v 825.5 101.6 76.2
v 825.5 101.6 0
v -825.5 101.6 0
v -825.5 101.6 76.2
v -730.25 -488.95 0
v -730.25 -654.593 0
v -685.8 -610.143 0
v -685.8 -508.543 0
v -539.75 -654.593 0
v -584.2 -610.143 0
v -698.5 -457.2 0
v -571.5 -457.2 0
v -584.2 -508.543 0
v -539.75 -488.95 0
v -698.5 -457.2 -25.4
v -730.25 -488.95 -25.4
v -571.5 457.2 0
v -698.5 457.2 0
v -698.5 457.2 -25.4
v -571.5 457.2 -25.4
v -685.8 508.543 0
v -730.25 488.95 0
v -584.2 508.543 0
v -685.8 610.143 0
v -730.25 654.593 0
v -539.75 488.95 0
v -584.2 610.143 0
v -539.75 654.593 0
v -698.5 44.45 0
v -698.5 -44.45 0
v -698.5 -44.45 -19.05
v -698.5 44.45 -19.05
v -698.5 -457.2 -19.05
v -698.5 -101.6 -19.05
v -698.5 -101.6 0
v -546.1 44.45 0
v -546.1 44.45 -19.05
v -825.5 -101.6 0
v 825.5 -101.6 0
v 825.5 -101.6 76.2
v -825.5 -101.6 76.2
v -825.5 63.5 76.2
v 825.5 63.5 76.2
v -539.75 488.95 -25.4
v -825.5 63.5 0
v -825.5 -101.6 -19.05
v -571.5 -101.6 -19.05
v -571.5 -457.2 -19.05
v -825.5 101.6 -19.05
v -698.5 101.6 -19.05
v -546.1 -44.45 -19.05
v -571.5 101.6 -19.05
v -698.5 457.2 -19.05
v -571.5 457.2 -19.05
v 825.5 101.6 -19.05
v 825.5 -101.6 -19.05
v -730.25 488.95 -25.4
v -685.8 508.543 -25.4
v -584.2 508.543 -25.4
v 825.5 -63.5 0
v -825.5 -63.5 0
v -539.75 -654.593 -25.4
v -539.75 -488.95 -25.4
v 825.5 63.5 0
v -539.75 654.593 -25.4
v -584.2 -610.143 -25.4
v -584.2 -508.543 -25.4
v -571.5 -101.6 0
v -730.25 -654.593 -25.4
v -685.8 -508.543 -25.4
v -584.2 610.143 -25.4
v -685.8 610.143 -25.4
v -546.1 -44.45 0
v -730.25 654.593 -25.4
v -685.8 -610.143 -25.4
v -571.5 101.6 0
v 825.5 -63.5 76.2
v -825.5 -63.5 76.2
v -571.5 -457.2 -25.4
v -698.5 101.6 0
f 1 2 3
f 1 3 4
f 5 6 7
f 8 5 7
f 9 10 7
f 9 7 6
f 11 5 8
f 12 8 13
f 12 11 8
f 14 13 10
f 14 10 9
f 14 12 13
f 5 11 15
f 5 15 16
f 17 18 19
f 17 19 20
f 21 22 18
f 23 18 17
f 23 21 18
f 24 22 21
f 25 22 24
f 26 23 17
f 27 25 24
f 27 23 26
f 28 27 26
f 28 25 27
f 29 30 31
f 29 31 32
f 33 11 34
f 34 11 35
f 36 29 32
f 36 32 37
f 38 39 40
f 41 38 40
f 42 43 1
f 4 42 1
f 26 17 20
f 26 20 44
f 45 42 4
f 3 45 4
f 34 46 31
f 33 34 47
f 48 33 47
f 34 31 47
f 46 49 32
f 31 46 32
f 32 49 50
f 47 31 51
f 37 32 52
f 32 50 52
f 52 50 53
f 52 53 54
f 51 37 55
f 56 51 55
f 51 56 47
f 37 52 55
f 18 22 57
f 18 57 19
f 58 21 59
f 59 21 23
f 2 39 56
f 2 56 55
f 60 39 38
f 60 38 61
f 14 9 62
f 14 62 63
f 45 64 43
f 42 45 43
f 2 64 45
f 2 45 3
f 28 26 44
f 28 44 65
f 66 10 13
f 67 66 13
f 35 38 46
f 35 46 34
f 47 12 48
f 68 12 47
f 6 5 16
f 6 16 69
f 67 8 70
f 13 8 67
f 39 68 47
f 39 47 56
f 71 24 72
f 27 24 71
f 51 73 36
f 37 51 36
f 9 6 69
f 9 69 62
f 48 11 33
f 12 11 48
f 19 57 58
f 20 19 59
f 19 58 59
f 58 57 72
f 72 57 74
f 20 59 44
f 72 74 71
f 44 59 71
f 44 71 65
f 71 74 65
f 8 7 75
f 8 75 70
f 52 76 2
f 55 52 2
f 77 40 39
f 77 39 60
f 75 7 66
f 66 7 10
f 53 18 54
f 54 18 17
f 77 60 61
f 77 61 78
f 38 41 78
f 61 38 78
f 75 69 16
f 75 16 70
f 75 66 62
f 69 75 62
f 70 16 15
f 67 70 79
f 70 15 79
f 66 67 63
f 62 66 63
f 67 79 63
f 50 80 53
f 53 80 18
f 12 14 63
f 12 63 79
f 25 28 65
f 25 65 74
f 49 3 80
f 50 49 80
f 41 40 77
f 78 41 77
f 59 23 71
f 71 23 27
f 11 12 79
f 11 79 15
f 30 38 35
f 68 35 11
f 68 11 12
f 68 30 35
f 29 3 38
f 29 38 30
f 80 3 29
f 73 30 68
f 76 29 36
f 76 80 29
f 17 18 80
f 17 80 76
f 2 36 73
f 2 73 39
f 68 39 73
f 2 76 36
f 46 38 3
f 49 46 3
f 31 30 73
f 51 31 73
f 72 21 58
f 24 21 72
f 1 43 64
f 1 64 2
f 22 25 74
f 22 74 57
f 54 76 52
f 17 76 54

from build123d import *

# Parameters (mm, degrees)
F0_W     = 1651
F0_H     = 914.4
F0_W_2   = 152.4
F0_H_2   = 88.9
F1_DEPTH = 19.05
F2_W     = 38.1
F2_H     = 76.2
F3_DEPTH = 1651
F4_W     = 1397
F4_H     = 355.6
F4_W_2   = 127
F5_DEPTH = 19.051
F6_W     = 101.6
F6_H     = 101.6
F7_DEPTH = 25.4


with BuildPart() as f1:
    # F0 (on Top) → F1 (new body)
    with BuildSketch(Plane.XY):
        Rectangle(F0_W, F0_H)
        with Locations((-622.3, 0)):
            Rectangle(F0_W_2, F0_H_2, mode=Mode.SUBTRACT)
    extrude(amount=-F1_DEPTH)

    # F4 (on face) → F5 (cut, through all)
    with BuildSketch(Plane.XY):
        with Locations((127, -279.4)):
            Rectangle(F4_W, F4_H)
        with Locations((-762, -279.4)):
            Rectangle(F4_W_2, F4_H)
        with Locations((127, 279.4)):
            Rectangle(F4_W, F4_H)
        with Locations((-762, 279.4)):
            Rectangle(F4_W_2, F4_H)
    extrude(amount=-F5_DEPTH, mode=Mode.SUBTRACT)


with BuildPart() as f3:
    # F2 (on face) → F3 (new body)
    with BuildSketch(Plane.YZ.offset(825.5)):
        with Locations((-82.55, 38.1)):
            Rectangle(F2_W, F2_H)
    extrude(amount=-F3_DEPTH)


with BuildPart() as f3b:
    # F2 (on face) → F3, piece 2 (new body)
    with BuildSketch(Plane.YZ.offset(825.5)):
        with Locations((82.55, 38.1)):
            Rectangle(F2_W, F2_H)
    extrude(amount=-F3_DEPTH)


with BuildPart() as f7:
    # F6 (on face) → F7 (new body)
    with BuildSketch(Plane.XY):
        Polygon((-571.5, -457.2), (-698.5, -457.2), (-730.25, -488.95), (-730.25, -654.5928061962), (-539.75, -654.5928061962), (-539.75, -488.95), align=None)
        with Locations((-635, -559.3428061962)):
            Rectangle(F6_W, F6_H, mode=Mode.SUBTRACT)
    extrude(amount=-F7_DEPTH)


with BuildPart() as f7b:
    # F6 (on face) → F7, piece 2 (new body)
    with BuildSketch(Plane.XY):
        Polygon((-730.25, 488.95), (-698.5, 457.2), (-571.5, 457.2), (-539.75, 488.95), (-539.75, 654.5928061962), (-730.25, 654.5928061962), align=None)
        with Locations((-635, 559.3428061962)):
            Rectangle(F6_W, F6_H, mode=Mode.SUBTRACT)
    extrude(amount=-F7_DEPTH)


solid = Compound([f1.part, f3.part, f3b.part, f7.part, f7b.part])
